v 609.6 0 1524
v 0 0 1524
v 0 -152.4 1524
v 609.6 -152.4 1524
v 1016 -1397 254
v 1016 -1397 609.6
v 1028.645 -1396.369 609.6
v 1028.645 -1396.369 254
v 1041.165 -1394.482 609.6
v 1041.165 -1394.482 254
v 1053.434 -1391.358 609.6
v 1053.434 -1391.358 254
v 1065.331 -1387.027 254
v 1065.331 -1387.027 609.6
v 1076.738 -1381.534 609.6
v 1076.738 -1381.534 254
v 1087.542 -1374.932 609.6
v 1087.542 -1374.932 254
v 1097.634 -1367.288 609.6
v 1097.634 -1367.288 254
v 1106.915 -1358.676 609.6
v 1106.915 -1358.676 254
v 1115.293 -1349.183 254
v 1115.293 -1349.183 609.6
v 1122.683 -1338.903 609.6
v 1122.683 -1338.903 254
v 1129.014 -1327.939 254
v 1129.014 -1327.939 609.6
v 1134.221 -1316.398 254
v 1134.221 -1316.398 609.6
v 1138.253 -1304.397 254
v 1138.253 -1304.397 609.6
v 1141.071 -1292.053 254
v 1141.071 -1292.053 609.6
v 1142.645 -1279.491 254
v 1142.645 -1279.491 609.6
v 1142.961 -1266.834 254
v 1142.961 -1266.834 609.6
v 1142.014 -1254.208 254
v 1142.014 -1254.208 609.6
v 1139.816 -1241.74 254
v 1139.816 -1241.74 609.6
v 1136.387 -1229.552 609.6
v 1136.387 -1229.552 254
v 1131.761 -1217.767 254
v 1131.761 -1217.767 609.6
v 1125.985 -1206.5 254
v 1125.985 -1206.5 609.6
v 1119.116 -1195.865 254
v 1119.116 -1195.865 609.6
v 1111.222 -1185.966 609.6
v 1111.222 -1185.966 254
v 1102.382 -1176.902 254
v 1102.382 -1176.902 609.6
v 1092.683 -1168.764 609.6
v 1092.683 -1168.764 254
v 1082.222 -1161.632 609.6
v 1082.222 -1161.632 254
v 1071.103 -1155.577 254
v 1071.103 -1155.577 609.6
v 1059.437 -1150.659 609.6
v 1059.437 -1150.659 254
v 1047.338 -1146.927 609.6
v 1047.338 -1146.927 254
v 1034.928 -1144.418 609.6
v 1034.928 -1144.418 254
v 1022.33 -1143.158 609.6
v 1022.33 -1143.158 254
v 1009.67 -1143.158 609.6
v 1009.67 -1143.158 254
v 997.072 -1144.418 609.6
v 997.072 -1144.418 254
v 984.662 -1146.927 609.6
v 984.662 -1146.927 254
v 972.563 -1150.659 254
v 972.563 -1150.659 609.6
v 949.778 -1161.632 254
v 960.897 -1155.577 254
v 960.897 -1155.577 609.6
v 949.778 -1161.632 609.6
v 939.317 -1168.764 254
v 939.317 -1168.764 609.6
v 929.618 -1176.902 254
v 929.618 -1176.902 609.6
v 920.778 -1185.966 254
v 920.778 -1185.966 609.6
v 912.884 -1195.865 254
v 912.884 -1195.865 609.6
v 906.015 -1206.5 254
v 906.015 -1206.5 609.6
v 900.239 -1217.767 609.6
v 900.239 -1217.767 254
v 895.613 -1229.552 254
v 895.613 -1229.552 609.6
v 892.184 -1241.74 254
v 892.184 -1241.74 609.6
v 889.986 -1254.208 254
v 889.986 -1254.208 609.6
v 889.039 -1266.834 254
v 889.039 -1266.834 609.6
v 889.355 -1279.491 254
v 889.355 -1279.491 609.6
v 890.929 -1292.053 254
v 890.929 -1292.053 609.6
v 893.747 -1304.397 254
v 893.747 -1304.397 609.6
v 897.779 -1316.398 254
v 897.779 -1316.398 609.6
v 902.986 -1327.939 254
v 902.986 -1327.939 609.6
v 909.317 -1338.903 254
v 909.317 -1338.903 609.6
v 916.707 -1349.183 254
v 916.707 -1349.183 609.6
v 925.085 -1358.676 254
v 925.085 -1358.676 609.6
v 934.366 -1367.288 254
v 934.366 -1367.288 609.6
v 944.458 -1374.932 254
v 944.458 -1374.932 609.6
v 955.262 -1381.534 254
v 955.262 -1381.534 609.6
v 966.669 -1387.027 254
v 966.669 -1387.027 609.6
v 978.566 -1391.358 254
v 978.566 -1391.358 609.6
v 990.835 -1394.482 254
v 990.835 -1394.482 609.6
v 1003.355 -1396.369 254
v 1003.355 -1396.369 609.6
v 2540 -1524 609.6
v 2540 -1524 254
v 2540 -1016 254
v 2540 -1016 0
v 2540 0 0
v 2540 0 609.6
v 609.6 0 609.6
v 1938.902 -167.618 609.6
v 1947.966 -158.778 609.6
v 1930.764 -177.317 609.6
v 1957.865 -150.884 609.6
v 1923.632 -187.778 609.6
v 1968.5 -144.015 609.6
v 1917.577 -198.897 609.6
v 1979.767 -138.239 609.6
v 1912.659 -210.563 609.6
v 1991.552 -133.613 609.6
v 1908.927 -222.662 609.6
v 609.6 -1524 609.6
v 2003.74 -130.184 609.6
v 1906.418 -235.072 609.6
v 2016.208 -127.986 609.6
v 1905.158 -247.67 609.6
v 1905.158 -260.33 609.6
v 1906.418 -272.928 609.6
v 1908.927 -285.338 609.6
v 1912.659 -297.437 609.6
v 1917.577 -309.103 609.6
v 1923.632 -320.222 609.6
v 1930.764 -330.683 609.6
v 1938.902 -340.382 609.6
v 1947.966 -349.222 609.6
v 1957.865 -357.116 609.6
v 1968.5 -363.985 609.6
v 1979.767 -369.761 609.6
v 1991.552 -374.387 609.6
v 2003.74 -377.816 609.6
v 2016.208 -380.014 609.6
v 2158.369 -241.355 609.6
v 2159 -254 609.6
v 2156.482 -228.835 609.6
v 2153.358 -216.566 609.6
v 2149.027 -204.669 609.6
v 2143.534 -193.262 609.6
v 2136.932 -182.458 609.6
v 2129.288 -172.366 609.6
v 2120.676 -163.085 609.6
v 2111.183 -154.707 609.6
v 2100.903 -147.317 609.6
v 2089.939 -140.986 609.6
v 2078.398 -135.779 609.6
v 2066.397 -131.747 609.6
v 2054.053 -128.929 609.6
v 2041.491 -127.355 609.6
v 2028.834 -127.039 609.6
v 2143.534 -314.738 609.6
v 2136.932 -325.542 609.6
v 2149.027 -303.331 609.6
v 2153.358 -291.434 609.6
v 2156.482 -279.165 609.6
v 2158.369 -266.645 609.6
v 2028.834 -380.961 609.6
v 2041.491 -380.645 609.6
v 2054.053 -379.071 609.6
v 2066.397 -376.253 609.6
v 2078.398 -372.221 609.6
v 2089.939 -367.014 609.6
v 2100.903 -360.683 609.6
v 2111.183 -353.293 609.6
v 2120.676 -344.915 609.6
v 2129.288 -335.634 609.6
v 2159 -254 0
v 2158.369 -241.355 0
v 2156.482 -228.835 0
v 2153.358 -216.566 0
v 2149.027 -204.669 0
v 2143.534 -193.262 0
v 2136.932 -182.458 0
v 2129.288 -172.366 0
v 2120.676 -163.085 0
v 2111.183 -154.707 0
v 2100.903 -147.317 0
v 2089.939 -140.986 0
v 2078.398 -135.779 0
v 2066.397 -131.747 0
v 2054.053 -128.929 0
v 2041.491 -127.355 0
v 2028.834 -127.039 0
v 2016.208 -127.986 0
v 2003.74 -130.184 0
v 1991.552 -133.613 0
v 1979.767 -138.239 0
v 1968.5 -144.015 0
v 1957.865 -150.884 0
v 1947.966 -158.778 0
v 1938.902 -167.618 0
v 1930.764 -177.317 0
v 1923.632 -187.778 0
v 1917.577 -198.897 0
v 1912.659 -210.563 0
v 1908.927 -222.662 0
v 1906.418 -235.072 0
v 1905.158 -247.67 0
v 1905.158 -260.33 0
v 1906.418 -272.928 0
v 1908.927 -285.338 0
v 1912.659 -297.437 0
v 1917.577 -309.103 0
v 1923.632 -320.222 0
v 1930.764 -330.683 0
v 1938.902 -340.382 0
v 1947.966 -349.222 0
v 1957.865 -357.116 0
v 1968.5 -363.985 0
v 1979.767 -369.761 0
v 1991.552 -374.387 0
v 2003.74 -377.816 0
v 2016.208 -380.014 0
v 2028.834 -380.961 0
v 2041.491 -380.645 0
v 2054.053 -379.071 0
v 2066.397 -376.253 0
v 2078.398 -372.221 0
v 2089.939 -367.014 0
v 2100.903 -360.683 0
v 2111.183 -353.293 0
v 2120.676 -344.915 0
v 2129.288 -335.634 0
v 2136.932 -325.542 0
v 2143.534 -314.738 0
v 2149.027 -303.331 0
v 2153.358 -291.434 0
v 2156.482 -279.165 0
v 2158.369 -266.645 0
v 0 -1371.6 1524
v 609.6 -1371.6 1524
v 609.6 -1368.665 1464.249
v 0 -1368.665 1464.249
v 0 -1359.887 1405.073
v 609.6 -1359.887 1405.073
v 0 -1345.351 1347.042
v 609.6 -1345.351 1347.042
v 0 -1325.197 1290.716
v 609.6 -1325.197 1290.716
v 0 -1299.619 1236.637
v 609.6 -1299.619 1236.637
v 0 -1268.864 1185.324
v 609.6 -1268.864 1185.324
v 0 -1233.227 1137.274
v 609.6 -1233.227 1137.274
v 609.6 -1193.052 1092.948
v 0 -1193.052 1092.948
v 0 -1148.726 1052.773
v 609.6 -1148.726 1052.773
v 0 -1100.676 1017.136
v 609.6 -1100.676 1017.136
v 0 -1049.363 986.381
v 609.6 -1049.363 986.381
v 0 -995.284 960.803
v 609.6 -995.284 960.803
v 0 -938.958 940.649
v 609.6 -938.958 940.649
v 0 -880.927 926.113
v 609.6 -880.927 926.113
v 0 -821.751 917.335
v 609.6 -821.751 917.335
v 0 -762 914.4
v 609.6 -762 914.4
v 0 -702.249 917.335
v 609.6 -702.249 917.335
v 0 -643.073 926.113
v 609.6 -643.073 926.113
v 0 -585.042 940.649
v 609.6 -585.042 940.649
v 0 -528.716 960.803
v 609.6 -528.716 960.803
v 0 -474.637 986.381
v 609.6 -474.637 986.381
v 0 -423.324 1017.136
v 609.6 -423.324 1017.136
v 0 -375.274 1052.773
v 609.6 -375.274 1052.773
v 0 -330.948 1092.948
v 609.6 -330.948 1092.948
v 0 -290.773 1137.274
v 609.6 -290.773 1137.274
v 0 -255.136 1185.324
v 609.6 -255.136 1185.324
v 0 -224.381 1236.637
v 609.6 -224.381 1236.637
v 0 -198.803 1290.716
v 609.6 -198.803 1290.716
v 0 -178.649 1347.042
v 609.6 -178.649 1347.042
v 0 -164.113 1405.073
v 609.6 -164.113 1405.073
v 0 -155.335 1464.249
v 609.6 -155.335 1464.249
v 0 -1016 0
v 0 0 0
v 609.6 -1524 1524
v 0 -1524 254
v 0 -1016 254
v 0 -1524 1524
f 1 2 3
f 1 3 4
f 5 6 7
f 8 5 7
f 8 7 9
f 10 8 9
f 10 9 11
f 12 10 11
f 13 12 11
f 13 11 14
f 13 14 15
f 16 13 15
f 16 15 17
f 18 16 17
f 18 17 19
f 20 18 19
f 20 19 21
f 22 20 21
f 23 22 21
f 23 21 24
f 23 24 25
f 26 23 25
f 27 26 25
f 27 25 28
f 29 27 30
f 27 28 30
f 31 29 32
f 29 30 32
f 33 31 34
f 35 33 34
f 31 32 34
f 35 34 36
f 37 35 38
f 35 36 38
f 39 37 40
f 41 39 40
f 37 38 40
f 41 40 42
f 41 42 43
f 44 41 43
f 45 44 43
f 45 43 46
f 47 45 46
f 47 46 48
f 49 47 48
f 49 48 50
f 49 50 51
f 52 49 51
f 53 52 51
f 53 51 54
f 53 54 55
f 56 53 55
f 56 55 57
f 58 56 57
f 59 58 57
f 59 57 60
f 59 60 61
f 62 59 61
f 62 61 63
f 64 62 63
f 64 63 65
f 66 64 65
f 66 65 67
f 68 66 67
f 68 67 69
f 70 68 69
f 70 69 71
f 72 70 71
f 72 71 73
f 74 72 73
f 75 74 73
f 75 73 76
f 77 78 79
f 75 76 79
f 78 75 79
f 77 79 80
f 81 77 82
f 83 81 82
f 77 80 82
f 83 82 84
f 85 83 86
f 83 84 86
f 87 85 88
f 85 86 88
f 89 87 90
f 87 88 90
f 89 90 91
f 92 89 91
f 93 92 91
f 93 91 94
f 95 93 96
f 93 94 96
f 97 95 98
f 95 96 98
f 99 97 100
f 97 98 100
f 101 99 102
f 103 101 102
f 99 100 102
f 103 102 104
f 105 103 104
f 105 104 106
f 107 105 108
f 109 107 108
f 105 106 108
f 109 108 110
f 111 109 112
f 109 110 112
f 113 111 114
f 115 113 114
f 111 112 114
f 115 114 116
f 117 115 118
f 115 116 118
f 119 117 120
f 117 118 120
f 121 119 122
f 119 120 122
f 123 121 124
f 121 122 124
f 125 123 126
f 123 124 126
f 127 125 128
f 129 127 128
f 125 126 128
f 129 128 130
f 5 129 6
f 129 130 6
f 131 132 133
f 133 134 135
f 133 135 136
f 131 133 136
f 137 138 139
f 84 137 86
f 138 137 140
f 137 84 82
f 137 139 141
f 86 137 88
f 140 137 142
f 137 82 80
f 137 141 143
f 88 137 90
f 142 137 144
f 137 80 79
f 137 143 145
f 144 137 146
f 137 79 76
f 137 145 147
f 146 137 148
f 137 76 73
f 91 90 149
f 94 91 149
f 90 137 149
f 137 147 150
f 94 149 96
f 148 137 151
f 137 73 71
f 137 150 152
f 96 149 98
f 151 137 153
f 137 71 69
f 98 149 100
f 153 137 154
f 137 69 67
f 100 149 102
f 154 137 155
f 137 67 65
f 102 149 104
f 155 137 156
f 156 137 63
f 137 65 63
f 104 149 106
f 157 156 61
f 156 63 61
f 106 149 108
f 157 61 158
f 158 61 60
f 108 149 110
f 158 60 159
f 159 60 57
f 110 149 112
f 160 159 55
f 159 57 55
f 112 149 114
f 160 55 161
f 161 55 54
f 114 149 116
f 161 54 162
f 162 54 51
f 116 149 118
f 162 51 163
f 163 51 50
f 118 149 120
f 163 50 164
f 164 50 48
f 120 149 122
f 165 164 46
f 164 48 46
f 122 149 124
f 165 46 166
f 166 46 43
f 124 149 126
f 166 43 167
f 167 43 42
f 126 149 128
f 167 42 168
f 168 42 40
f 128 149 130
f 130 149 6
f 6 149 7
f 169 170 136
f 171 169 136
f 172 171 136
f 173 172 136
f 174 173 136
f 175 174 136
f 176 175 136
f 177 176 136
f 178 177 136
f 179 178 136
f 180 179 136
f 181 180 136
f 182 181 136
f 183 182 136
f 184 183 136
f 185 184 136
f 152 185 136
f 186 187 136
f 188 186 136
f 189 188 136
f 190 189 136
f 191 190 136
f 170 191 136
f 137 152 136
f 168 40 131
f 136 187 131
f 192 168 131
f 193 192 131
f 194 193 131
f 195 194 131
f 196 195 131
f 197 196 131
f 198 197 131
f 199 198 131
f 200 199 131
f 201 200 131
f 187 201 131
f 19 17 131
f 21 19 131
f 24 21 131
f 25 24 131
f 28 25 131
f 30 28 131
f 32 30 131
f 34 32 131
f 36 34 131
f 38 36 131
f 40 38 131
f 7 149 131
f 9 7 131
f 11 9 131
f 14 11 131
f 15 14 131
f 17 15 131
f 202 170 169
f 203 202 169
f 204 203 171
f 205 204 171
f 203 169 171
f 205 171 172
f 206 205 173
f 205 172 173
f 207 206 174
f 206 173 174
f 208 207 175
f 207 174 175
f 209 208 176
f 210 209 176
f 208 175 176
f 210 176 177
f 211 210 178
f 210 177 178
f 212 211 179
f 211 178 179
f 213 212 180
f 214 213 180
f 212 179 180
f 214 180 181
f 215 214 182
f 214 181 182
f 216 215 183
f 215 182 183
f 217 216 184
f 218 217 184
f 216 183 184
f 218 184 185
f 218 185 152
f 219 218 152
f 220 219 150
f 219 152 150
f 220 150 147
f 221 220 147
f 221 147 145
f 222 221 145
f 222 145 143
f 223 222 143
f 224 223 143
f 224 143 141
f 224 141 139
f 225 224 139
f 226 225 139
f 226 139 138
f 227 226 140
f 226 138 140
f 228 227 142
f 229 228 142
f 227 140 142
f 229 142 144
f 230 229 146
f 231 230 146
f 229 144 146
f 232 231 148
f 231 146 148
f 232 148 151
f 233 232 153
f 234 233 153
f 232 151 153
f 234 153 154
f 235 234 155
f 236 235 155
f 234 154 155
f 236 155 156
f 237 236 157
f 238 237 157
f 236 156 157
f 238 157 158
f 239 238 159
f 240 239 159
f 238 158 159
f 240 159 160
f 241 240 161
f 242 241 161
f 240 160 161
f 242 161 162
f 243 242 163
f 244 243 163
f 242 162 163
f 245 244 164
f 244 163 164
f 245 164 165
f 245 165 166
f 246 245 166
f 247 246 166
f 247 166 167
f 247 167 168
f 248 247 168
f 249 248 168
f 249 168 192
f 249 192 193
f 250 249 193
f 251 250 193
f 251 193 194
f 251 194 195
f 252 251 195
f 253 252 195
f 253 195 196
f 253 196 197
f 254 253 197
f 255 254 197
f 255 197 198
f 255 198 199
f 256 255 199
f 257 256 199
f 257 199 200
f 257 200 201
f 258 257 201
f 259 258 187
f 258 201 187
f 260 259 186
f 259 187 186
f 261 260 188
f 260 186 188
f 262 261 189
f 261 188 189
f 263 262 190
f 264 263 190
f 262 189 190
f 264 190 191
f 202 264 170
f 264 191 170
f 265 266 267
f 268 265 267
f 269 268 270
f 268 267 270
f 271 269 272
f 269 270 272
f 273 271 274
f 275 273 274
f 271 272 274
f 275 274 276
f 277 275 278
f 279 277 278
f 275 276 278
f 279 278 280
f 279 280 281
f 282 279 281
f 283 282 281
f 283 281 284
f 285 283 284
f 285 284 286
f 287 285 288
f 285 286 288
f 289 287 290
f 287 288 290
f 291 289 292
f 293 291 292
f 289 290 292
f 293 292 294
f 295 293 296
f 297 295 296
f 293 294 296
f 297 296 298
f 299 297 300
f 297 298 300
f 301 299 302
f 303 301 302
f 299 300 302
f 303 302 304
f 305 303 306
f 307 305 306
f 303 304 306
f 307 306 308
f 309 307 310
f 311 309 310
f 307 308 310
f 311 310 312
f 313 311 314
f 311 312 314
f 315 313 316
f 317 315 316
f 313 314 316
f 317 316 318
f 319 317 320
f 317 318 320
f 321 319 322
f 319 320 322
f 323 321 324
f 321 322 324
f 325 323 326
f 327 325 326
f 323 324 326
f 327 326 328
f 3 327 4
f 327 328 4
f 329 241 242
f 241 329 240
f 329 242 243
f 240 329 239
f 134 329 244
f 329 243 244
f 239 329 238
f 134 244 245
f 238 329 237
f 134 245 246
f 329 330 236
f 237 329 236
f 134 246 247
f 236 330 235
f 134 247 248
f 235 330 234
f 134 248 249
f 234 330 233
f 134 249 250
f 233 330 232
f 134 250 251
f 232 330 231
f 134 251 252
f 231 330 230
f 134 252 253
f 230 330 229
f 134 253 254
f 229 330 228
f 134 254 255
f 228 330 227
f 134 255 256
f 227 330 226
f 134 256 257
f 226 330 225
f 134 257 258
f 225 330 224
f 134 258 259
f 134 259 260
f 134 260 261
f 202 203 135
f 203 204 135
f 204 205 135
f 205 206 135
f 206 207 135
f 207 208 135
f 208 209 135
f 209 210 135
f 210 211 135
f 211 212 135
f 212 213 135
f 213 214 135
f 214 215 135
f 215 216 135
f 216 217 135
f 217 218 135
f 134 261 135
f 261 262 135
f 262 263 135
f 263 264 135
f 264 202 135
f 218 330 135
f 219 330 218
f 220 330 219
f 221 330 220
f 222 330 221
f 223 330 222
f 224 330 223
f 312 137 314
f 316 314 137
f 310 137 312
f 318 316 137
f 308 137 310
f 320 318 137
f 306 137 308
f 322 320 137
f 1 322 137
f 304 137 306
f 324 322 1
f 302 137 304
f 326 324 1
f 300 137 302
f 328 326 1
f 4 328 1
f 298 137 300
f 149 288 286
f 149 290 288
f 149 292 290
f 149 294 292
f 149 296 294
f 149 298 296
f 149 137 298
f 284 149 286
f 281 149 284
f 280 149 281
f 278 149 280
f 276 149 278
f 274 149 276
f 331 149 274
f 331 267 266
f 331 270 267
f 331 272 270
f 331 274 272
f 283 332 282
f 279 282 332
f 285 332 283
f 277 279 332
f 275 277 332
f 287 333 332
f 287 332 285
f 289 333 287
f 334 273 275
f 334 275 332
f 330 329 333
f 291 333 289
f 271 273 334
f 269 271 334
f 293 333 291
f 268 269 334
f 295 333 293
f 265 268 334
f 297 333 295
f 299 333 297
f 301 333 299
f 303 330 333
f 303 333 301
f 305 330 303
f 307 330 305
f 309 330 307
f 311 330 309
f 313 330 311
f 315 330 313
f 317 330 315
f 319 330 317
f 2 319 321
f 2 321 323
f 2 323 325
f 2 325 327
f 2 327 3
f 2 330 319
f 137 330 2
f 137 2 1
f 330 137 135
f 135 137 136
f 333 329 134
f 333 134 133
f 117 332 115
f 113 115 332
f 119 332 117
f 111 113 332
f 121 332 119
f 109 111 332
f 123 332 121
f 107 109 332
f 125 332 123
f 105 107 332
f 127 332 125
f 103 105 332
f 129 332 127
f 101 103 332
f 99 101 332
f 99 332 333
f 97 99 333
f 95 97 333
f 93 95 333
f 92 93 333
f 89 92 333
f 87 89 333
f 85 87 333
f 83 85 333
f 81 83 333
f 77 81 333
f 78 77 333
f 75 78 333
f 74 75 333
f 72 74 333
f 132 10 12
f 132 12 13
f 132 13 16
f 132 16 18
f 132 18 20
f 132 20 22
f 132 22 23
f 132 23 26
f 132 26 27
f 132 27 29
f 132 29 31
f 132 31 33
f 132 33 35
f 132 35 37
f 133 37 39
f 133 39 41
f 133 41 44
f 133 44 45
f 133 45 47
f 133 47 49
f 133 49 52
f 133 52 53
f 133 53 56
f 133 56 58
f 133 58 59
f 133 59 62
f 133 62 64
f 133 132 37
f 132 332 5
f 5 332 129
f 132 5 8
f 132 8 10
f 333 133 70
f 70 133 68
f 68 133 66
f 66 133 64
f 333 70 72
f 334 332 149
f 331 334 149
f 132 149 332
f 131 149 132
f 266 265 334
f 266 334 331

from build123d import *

# Parameters (mm, degrees)
F0_W     = 2540
F0_H     = 1524
F1_DEPTH = 1524
F2_W     = 1930.4
F2_H     = 914.4
F3_DEPTH = 1524
F4_W     = 508
F4_H     = 254
F5_DEPTH = 2540
F7_DEPTH = 609.6
F9_DEPTH = 609.6


with BuildPart() as f1:
    # F0 (on Front) → F1 (new body)
    with BuildSketch(Plane.XZ):
        with Locations((1270, 762)):
            Rectangle(F0_W, F0_H)
    extrude(amount=F1_DEPTH)

    # F2 (on face) → F3 (cut)
    with BuildSketch(Plane.XZ.offset(1524)):
        with Locations((1574.8, 1066.8)):
            Rectangle(F2_W, F2_H)
    extrude(amount=-F3_DEPTH, mode=Mode.SUBTRACT)

    # F4 (on face) → F5 (cut)
    with BuildSketch(Plane.YZ.offset(2540)):
        with Locations((-1270, 127)):
            Rectangle(F4_W, F4_H)
    extrude(amount=-F5_DEPTH, mode=Mode.SUBTRACT)

    # F6 (on face) → F7 (cut)
    with BuildSketch(Plane.YZ.offset(609.6)):
        with BuildLine():
            Line((-762, 1524), (-1371.6, 1524))
            ThreePointArc((-1371.6, 1524), (-762, 914.4), (-152.4, 1524))
            Line((-152.4, 1524), (-762, 1524))
        make_face()
    extrude(amount=-F7_DEPTH, mode=Mode.SUBTRACT)

    # F8 (on face) → F9 (cut)
    with BuildSketch(Plane.XY.offset(609.6)):
        with BuildLine():
            Line((1016, -1270), (889, -1270))
            ThreePointArc((889, -1270), (926.1974387893, -1359.8025612107), (1016, -1397))
            Line((1016, -1397), (1016, -1270))
        make_face()
        with BuildLine():
            ThreePointArc((1143, -1270), (1016, -1143), (889, -1270))
            Line((889, -1270), (1016, -1270))
            Line((1016, -1270), (1016, -1397))
            ThreePointArc((1016, -1397), (1105.8025612107, -1359.8025612107), (1143, -1270))
        make_face()
        with BuildLine():
            Line((2032, -254), (2032, -127))
            ThreePointArc((2032, -127), (1942.1974387893, -343.8025612107), (2159, -254))
            Line((2159, -254), (2032, -254))
        make_face()
        with BuildLine():
            ThreePointArc((2159, -254), (2121.8025612107, -164.1974387893), (2032, -127))
            Line((2032, -127), (2032, -254))
            Line((2032, -254), (2159, -254))
        make_face()
    extrude(amount=-F9_DEPTH, mode=Mode.SUBTRACT)


solid = f1.part
